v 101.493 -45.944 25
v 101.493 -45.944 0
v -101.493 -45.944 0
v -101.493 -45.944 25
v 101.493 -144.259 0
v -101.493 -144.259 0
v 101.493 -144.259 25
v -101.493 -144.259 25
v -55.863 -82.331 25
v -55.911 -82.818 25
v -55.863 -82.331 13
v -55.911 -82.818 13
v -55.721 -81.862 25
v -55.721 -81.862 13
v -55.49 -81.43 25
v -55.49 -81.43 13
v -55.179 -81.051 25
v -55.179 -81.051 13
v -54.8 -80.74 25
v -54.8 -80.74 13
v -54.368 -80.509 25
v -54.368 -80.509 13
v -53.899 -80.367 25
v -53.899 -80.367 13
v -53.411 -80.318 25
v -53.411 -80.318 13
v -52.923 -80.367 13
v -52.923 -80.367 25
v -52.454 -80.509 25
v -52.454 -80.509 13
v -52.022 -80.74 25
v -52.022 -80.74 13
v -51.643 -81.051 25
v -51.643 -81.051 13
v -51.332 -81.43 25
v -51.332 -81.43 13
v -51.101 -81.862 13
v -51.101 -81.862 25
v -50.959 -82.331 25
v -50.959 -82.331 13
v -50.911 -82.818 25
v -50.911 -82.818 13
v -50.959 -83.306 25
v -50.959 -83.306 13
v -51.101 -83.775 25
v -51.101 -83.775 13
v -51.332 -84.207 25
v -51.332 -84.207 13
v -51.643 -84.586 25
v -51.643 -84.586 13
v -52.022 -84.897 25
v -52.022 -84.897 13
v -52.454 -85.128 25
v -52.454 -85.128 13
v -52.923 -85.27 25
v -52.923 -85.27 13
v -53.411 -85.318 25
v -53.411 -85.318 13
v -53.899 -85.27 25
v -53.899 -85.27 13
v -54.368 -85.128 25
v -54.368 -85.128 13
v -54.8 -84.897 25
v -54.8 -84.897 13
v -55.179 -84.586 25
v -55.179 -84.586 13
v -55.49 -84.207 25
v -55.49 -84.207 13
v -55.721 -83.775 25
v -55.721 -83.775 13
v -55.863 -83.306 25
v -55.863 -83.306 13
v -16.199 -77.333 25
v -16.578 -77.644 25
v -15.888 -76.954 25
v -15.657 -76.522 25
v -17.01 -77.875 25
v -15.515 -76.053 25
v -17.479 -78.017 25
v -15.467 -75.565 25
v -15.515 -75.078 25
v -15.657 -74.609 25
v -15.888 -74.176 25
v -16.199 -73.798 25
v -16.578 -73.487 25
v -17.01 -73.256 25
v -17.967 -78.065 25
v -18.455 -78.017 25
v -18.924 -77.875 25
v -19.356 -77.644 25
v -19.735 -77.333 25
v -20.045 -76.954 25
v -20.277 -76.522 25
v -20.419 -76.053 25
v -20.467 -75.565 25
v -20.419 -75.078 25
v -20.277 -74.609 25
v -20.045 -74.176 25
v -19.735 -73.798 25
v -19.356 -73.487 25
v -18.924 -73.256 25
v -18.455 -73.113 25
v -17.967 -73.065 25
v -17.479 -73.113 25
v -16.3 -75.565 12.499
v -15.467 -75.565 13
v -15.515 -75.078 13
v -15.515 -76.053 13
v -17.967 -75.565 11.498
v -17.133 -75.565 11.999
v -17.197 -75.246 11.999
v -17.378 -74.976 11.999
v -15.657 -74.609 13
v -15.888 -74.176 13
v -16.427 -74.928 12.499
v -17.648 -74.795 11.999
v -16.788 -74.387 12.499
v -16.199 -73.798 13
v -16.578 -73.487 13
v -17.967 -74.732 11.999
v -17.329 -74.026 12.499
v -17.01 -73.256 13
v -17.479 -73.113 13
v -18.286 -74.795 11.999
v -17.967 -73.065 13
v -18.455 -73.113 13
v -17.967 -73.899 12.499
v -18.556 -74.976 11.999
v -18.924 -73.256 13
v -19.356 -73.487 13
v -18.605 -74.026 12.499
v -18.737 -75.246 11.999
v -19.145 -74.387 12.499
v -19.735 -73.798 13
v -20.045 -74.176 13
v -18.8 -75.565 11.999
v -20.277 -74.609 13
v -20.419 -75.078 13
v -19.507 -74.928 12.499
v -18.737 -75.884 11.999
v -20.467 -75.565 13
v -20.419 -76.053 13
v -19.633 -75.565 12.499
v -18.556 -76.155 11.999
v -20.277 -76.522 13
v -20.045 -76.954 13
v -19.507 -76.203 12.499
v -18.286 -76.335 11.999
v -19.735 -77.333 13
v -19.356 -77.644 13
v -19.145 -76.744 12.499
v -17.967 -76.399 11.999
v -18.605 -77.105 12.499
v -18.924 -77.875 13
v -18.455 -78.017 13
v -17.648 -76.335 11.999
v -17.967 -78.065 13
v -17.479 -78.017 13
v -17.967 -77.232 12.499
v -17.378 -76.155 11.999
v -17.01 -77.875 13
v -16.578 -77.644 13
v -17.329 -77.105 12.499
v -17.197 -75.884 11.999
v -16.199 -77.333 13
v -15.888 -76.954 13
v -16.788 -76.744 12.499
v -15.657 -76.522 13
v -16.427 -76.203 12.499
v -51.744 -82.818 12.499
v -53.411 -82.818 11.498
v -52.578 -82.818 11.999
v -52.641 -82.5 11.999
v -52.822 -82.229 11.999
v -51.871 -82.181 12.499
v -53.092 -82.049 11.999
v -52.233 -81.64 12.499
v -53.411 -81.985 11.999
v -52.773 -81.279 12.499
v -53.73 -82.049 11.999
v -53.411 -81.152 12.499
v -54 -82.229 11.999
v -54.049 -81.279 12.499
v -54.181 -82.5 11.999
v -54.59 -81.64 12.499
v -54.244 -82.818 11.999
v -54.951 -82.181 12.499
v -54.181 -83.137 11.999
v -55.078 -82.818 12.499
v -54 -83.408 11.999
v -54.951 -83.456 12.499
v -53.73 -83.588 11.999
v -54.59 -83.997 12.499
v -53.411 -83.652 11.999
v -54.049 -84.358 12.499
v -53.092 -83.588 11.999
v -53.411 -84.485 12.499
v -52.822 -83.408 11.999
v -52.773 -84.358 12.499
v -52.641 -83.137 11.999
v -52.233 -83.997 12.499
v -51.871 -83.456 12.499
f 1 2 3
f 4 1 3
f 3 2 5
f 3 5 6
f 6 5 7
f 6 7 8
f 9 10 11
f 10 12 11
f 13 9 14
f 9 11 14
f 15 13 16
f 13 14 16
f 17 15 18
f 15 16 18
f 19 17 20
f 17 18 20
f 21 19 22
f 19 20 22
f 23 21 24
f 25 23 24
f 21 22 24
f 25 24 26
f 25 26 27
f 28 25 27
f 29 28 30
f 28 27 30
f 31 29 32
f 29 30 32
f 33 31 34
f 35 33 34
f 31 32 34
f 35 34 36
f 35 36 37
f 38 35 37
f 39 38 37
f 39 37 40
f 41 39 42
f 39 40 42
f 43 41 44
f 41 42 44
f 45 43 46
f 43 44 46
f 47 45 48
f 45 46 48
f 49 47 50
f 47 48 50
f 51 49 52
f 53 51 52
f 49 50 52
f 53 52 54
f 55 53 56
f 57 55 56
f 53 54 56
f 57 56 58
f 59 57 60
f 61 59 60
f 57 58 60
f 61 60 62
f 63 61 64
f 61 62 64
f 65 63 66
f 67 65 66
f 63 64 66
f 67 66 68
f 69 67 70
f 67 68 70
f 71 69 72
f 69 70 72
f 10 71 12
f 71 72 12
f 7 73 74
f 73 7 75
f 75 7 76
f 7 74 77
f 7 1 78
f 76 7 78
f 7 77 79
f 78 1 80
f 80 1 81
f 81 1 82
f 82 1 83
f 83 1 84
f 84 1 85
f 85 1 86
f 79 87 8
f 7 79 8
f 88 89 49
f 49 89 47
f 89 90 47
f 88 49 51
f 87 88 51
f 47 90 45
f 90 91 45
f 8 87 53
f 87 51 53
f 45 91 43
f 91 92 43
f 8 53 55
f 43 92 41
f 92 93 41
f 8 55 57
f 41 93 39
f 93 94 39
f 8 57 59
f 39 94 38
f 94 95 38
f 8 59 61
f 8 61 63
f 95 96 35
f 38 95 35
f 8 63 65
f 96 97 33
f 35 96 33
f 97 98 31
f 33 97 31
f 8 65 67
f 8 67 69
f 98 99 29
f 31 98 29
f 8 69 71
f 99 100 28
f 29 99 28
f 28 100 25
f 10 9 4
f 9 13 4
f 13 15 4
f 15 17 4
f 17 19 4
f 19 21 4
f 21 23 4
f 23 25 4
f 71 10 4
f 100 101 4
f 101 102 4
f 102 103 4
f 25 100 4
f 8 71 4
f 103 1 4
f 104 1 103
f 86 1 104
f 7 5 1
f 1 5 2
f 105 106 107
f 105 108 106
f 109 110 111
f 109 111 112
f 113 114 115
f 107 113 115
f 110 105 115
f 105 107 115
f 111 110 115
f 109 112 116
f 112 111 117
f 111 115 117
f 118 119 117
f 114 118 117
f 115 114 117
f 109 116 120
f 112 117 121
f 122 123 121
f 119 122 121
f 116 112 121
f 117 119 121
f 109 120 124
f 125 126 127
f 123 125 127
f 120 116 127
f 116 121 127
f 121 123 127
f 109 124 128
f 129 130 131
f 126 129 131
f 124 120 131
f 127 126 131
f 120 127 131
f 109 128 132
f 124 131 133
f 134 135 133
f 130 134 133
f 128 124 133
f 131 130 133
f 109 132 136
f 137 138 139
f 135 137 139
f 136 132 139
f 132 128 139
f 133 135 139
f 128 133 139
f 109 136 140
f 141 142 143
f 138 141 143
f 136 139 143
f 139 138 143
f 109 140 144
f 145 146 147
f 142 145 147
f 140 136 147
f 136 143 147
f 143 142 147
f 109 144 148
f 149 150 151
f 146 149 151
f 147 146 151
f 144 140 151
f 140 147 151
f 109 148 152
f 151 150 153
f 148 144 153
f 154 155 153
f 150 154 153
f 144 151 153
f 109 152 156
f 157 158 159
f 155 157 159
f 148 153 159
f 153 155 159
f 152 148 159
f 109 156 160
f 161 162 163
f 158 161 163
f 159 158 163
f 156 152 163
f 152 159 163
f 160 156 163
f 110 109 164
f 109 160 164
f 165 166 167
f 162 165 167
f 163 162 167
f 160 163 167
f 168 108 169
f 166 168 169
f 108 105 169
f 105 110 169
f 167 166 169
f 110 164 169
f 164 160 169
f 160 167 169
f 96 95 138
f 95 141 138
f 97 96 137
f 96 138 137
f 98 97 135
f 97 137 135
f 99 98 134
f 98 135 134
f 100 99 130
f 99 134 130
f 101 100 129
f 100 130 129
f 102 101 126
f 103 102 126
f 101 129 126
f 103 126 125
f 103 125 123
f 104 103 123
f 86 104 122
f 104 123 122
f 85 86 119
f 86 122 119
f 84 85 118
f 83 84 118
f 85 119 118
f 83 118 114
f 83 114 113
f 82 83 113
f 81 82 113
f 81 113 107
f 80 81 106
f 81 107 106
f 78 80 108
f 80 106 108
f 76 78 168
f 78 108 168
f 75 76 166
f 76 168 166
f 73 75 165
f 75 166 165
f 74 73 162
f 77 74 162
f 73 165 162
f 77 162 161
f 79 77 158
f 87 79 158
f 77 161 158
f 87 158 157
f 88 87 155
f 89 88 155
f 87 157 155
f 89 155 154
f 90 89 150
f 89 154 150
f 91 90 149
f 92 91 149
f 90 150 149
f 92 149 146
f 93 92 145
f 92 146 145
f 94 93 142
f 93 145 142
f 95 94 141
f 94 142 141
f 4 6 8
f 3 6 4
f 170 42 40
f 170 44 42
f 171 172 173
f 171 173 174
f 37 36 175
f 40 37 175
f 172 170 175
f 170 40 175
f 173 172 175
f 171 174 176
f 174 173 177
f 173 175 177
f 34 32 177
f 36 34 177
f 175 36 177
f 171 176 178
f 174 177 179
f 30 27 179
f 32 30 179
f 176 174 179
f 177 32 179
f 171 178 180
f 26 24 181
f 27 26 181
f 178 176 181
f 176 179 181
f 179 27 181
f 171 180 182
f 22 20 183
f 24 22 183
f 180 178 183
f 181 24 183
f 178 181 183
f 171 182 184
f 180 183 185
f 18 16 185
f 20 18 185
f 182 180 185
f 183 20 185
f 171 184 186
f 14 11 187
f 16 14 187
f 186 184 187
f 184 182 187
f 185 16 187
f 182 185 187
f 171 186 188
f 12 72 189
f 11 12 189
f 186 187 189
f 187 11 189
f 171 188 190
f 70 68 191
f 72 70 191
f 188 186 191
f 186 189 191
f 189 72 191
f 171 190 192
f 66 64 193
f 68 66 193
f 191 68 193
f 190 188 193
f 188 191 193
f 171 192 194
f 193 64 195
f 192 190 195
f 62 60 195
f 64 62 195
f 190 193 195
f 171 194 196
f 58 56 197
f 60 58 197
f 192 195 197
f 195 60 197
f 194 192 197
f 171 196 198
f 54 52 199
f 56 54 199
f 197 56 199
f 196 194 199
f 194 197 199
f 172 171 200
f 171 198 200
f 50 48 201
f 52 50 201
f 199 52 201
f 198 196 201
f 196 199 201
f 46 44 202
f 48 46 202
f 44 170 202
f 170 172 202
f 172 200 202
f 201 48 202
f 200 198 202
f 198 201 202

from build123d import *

# Parameters (mm, degrees)
F0_W     = 113.3287157863
F0_H     = 98.3149297535
F1_DEPTH = 25
F4_D     = 5
F4_DEPTH = 12
F4_TIP   = 1.5021515476


with BuildPart() as f1:
    # F0 (on Top) → F1 (new body)
    with BuildSketch(Plane.XY):
        with Locations((-44.8288666084, -95.1015558094)):
            Rectangle(F0_W, F0_H)
    extrude(amount=F1_DEPTH)

    # F2: F1 across plane


with BuildPart() as f1_1:
    add(f1.part)
    add(f1.part.mirror(Plane.YZ))

    # F4
    with Locations(Plane.XY.offset(25)):
        with Locations((-53.4110553563, -82.8184708953), (-17.9668162018, -75.5653455853)):
            Hole(F4_D / 2, depth=F4_DEPTH)
            with Locations((0, 0, -(F4_DEPTH + F4_TIP / 2))):  # 118° drill point
                Cone(0, F4_D / 2, F4_TIP, mode=Mode.SUBTRACT)


solid = f1_1.part
